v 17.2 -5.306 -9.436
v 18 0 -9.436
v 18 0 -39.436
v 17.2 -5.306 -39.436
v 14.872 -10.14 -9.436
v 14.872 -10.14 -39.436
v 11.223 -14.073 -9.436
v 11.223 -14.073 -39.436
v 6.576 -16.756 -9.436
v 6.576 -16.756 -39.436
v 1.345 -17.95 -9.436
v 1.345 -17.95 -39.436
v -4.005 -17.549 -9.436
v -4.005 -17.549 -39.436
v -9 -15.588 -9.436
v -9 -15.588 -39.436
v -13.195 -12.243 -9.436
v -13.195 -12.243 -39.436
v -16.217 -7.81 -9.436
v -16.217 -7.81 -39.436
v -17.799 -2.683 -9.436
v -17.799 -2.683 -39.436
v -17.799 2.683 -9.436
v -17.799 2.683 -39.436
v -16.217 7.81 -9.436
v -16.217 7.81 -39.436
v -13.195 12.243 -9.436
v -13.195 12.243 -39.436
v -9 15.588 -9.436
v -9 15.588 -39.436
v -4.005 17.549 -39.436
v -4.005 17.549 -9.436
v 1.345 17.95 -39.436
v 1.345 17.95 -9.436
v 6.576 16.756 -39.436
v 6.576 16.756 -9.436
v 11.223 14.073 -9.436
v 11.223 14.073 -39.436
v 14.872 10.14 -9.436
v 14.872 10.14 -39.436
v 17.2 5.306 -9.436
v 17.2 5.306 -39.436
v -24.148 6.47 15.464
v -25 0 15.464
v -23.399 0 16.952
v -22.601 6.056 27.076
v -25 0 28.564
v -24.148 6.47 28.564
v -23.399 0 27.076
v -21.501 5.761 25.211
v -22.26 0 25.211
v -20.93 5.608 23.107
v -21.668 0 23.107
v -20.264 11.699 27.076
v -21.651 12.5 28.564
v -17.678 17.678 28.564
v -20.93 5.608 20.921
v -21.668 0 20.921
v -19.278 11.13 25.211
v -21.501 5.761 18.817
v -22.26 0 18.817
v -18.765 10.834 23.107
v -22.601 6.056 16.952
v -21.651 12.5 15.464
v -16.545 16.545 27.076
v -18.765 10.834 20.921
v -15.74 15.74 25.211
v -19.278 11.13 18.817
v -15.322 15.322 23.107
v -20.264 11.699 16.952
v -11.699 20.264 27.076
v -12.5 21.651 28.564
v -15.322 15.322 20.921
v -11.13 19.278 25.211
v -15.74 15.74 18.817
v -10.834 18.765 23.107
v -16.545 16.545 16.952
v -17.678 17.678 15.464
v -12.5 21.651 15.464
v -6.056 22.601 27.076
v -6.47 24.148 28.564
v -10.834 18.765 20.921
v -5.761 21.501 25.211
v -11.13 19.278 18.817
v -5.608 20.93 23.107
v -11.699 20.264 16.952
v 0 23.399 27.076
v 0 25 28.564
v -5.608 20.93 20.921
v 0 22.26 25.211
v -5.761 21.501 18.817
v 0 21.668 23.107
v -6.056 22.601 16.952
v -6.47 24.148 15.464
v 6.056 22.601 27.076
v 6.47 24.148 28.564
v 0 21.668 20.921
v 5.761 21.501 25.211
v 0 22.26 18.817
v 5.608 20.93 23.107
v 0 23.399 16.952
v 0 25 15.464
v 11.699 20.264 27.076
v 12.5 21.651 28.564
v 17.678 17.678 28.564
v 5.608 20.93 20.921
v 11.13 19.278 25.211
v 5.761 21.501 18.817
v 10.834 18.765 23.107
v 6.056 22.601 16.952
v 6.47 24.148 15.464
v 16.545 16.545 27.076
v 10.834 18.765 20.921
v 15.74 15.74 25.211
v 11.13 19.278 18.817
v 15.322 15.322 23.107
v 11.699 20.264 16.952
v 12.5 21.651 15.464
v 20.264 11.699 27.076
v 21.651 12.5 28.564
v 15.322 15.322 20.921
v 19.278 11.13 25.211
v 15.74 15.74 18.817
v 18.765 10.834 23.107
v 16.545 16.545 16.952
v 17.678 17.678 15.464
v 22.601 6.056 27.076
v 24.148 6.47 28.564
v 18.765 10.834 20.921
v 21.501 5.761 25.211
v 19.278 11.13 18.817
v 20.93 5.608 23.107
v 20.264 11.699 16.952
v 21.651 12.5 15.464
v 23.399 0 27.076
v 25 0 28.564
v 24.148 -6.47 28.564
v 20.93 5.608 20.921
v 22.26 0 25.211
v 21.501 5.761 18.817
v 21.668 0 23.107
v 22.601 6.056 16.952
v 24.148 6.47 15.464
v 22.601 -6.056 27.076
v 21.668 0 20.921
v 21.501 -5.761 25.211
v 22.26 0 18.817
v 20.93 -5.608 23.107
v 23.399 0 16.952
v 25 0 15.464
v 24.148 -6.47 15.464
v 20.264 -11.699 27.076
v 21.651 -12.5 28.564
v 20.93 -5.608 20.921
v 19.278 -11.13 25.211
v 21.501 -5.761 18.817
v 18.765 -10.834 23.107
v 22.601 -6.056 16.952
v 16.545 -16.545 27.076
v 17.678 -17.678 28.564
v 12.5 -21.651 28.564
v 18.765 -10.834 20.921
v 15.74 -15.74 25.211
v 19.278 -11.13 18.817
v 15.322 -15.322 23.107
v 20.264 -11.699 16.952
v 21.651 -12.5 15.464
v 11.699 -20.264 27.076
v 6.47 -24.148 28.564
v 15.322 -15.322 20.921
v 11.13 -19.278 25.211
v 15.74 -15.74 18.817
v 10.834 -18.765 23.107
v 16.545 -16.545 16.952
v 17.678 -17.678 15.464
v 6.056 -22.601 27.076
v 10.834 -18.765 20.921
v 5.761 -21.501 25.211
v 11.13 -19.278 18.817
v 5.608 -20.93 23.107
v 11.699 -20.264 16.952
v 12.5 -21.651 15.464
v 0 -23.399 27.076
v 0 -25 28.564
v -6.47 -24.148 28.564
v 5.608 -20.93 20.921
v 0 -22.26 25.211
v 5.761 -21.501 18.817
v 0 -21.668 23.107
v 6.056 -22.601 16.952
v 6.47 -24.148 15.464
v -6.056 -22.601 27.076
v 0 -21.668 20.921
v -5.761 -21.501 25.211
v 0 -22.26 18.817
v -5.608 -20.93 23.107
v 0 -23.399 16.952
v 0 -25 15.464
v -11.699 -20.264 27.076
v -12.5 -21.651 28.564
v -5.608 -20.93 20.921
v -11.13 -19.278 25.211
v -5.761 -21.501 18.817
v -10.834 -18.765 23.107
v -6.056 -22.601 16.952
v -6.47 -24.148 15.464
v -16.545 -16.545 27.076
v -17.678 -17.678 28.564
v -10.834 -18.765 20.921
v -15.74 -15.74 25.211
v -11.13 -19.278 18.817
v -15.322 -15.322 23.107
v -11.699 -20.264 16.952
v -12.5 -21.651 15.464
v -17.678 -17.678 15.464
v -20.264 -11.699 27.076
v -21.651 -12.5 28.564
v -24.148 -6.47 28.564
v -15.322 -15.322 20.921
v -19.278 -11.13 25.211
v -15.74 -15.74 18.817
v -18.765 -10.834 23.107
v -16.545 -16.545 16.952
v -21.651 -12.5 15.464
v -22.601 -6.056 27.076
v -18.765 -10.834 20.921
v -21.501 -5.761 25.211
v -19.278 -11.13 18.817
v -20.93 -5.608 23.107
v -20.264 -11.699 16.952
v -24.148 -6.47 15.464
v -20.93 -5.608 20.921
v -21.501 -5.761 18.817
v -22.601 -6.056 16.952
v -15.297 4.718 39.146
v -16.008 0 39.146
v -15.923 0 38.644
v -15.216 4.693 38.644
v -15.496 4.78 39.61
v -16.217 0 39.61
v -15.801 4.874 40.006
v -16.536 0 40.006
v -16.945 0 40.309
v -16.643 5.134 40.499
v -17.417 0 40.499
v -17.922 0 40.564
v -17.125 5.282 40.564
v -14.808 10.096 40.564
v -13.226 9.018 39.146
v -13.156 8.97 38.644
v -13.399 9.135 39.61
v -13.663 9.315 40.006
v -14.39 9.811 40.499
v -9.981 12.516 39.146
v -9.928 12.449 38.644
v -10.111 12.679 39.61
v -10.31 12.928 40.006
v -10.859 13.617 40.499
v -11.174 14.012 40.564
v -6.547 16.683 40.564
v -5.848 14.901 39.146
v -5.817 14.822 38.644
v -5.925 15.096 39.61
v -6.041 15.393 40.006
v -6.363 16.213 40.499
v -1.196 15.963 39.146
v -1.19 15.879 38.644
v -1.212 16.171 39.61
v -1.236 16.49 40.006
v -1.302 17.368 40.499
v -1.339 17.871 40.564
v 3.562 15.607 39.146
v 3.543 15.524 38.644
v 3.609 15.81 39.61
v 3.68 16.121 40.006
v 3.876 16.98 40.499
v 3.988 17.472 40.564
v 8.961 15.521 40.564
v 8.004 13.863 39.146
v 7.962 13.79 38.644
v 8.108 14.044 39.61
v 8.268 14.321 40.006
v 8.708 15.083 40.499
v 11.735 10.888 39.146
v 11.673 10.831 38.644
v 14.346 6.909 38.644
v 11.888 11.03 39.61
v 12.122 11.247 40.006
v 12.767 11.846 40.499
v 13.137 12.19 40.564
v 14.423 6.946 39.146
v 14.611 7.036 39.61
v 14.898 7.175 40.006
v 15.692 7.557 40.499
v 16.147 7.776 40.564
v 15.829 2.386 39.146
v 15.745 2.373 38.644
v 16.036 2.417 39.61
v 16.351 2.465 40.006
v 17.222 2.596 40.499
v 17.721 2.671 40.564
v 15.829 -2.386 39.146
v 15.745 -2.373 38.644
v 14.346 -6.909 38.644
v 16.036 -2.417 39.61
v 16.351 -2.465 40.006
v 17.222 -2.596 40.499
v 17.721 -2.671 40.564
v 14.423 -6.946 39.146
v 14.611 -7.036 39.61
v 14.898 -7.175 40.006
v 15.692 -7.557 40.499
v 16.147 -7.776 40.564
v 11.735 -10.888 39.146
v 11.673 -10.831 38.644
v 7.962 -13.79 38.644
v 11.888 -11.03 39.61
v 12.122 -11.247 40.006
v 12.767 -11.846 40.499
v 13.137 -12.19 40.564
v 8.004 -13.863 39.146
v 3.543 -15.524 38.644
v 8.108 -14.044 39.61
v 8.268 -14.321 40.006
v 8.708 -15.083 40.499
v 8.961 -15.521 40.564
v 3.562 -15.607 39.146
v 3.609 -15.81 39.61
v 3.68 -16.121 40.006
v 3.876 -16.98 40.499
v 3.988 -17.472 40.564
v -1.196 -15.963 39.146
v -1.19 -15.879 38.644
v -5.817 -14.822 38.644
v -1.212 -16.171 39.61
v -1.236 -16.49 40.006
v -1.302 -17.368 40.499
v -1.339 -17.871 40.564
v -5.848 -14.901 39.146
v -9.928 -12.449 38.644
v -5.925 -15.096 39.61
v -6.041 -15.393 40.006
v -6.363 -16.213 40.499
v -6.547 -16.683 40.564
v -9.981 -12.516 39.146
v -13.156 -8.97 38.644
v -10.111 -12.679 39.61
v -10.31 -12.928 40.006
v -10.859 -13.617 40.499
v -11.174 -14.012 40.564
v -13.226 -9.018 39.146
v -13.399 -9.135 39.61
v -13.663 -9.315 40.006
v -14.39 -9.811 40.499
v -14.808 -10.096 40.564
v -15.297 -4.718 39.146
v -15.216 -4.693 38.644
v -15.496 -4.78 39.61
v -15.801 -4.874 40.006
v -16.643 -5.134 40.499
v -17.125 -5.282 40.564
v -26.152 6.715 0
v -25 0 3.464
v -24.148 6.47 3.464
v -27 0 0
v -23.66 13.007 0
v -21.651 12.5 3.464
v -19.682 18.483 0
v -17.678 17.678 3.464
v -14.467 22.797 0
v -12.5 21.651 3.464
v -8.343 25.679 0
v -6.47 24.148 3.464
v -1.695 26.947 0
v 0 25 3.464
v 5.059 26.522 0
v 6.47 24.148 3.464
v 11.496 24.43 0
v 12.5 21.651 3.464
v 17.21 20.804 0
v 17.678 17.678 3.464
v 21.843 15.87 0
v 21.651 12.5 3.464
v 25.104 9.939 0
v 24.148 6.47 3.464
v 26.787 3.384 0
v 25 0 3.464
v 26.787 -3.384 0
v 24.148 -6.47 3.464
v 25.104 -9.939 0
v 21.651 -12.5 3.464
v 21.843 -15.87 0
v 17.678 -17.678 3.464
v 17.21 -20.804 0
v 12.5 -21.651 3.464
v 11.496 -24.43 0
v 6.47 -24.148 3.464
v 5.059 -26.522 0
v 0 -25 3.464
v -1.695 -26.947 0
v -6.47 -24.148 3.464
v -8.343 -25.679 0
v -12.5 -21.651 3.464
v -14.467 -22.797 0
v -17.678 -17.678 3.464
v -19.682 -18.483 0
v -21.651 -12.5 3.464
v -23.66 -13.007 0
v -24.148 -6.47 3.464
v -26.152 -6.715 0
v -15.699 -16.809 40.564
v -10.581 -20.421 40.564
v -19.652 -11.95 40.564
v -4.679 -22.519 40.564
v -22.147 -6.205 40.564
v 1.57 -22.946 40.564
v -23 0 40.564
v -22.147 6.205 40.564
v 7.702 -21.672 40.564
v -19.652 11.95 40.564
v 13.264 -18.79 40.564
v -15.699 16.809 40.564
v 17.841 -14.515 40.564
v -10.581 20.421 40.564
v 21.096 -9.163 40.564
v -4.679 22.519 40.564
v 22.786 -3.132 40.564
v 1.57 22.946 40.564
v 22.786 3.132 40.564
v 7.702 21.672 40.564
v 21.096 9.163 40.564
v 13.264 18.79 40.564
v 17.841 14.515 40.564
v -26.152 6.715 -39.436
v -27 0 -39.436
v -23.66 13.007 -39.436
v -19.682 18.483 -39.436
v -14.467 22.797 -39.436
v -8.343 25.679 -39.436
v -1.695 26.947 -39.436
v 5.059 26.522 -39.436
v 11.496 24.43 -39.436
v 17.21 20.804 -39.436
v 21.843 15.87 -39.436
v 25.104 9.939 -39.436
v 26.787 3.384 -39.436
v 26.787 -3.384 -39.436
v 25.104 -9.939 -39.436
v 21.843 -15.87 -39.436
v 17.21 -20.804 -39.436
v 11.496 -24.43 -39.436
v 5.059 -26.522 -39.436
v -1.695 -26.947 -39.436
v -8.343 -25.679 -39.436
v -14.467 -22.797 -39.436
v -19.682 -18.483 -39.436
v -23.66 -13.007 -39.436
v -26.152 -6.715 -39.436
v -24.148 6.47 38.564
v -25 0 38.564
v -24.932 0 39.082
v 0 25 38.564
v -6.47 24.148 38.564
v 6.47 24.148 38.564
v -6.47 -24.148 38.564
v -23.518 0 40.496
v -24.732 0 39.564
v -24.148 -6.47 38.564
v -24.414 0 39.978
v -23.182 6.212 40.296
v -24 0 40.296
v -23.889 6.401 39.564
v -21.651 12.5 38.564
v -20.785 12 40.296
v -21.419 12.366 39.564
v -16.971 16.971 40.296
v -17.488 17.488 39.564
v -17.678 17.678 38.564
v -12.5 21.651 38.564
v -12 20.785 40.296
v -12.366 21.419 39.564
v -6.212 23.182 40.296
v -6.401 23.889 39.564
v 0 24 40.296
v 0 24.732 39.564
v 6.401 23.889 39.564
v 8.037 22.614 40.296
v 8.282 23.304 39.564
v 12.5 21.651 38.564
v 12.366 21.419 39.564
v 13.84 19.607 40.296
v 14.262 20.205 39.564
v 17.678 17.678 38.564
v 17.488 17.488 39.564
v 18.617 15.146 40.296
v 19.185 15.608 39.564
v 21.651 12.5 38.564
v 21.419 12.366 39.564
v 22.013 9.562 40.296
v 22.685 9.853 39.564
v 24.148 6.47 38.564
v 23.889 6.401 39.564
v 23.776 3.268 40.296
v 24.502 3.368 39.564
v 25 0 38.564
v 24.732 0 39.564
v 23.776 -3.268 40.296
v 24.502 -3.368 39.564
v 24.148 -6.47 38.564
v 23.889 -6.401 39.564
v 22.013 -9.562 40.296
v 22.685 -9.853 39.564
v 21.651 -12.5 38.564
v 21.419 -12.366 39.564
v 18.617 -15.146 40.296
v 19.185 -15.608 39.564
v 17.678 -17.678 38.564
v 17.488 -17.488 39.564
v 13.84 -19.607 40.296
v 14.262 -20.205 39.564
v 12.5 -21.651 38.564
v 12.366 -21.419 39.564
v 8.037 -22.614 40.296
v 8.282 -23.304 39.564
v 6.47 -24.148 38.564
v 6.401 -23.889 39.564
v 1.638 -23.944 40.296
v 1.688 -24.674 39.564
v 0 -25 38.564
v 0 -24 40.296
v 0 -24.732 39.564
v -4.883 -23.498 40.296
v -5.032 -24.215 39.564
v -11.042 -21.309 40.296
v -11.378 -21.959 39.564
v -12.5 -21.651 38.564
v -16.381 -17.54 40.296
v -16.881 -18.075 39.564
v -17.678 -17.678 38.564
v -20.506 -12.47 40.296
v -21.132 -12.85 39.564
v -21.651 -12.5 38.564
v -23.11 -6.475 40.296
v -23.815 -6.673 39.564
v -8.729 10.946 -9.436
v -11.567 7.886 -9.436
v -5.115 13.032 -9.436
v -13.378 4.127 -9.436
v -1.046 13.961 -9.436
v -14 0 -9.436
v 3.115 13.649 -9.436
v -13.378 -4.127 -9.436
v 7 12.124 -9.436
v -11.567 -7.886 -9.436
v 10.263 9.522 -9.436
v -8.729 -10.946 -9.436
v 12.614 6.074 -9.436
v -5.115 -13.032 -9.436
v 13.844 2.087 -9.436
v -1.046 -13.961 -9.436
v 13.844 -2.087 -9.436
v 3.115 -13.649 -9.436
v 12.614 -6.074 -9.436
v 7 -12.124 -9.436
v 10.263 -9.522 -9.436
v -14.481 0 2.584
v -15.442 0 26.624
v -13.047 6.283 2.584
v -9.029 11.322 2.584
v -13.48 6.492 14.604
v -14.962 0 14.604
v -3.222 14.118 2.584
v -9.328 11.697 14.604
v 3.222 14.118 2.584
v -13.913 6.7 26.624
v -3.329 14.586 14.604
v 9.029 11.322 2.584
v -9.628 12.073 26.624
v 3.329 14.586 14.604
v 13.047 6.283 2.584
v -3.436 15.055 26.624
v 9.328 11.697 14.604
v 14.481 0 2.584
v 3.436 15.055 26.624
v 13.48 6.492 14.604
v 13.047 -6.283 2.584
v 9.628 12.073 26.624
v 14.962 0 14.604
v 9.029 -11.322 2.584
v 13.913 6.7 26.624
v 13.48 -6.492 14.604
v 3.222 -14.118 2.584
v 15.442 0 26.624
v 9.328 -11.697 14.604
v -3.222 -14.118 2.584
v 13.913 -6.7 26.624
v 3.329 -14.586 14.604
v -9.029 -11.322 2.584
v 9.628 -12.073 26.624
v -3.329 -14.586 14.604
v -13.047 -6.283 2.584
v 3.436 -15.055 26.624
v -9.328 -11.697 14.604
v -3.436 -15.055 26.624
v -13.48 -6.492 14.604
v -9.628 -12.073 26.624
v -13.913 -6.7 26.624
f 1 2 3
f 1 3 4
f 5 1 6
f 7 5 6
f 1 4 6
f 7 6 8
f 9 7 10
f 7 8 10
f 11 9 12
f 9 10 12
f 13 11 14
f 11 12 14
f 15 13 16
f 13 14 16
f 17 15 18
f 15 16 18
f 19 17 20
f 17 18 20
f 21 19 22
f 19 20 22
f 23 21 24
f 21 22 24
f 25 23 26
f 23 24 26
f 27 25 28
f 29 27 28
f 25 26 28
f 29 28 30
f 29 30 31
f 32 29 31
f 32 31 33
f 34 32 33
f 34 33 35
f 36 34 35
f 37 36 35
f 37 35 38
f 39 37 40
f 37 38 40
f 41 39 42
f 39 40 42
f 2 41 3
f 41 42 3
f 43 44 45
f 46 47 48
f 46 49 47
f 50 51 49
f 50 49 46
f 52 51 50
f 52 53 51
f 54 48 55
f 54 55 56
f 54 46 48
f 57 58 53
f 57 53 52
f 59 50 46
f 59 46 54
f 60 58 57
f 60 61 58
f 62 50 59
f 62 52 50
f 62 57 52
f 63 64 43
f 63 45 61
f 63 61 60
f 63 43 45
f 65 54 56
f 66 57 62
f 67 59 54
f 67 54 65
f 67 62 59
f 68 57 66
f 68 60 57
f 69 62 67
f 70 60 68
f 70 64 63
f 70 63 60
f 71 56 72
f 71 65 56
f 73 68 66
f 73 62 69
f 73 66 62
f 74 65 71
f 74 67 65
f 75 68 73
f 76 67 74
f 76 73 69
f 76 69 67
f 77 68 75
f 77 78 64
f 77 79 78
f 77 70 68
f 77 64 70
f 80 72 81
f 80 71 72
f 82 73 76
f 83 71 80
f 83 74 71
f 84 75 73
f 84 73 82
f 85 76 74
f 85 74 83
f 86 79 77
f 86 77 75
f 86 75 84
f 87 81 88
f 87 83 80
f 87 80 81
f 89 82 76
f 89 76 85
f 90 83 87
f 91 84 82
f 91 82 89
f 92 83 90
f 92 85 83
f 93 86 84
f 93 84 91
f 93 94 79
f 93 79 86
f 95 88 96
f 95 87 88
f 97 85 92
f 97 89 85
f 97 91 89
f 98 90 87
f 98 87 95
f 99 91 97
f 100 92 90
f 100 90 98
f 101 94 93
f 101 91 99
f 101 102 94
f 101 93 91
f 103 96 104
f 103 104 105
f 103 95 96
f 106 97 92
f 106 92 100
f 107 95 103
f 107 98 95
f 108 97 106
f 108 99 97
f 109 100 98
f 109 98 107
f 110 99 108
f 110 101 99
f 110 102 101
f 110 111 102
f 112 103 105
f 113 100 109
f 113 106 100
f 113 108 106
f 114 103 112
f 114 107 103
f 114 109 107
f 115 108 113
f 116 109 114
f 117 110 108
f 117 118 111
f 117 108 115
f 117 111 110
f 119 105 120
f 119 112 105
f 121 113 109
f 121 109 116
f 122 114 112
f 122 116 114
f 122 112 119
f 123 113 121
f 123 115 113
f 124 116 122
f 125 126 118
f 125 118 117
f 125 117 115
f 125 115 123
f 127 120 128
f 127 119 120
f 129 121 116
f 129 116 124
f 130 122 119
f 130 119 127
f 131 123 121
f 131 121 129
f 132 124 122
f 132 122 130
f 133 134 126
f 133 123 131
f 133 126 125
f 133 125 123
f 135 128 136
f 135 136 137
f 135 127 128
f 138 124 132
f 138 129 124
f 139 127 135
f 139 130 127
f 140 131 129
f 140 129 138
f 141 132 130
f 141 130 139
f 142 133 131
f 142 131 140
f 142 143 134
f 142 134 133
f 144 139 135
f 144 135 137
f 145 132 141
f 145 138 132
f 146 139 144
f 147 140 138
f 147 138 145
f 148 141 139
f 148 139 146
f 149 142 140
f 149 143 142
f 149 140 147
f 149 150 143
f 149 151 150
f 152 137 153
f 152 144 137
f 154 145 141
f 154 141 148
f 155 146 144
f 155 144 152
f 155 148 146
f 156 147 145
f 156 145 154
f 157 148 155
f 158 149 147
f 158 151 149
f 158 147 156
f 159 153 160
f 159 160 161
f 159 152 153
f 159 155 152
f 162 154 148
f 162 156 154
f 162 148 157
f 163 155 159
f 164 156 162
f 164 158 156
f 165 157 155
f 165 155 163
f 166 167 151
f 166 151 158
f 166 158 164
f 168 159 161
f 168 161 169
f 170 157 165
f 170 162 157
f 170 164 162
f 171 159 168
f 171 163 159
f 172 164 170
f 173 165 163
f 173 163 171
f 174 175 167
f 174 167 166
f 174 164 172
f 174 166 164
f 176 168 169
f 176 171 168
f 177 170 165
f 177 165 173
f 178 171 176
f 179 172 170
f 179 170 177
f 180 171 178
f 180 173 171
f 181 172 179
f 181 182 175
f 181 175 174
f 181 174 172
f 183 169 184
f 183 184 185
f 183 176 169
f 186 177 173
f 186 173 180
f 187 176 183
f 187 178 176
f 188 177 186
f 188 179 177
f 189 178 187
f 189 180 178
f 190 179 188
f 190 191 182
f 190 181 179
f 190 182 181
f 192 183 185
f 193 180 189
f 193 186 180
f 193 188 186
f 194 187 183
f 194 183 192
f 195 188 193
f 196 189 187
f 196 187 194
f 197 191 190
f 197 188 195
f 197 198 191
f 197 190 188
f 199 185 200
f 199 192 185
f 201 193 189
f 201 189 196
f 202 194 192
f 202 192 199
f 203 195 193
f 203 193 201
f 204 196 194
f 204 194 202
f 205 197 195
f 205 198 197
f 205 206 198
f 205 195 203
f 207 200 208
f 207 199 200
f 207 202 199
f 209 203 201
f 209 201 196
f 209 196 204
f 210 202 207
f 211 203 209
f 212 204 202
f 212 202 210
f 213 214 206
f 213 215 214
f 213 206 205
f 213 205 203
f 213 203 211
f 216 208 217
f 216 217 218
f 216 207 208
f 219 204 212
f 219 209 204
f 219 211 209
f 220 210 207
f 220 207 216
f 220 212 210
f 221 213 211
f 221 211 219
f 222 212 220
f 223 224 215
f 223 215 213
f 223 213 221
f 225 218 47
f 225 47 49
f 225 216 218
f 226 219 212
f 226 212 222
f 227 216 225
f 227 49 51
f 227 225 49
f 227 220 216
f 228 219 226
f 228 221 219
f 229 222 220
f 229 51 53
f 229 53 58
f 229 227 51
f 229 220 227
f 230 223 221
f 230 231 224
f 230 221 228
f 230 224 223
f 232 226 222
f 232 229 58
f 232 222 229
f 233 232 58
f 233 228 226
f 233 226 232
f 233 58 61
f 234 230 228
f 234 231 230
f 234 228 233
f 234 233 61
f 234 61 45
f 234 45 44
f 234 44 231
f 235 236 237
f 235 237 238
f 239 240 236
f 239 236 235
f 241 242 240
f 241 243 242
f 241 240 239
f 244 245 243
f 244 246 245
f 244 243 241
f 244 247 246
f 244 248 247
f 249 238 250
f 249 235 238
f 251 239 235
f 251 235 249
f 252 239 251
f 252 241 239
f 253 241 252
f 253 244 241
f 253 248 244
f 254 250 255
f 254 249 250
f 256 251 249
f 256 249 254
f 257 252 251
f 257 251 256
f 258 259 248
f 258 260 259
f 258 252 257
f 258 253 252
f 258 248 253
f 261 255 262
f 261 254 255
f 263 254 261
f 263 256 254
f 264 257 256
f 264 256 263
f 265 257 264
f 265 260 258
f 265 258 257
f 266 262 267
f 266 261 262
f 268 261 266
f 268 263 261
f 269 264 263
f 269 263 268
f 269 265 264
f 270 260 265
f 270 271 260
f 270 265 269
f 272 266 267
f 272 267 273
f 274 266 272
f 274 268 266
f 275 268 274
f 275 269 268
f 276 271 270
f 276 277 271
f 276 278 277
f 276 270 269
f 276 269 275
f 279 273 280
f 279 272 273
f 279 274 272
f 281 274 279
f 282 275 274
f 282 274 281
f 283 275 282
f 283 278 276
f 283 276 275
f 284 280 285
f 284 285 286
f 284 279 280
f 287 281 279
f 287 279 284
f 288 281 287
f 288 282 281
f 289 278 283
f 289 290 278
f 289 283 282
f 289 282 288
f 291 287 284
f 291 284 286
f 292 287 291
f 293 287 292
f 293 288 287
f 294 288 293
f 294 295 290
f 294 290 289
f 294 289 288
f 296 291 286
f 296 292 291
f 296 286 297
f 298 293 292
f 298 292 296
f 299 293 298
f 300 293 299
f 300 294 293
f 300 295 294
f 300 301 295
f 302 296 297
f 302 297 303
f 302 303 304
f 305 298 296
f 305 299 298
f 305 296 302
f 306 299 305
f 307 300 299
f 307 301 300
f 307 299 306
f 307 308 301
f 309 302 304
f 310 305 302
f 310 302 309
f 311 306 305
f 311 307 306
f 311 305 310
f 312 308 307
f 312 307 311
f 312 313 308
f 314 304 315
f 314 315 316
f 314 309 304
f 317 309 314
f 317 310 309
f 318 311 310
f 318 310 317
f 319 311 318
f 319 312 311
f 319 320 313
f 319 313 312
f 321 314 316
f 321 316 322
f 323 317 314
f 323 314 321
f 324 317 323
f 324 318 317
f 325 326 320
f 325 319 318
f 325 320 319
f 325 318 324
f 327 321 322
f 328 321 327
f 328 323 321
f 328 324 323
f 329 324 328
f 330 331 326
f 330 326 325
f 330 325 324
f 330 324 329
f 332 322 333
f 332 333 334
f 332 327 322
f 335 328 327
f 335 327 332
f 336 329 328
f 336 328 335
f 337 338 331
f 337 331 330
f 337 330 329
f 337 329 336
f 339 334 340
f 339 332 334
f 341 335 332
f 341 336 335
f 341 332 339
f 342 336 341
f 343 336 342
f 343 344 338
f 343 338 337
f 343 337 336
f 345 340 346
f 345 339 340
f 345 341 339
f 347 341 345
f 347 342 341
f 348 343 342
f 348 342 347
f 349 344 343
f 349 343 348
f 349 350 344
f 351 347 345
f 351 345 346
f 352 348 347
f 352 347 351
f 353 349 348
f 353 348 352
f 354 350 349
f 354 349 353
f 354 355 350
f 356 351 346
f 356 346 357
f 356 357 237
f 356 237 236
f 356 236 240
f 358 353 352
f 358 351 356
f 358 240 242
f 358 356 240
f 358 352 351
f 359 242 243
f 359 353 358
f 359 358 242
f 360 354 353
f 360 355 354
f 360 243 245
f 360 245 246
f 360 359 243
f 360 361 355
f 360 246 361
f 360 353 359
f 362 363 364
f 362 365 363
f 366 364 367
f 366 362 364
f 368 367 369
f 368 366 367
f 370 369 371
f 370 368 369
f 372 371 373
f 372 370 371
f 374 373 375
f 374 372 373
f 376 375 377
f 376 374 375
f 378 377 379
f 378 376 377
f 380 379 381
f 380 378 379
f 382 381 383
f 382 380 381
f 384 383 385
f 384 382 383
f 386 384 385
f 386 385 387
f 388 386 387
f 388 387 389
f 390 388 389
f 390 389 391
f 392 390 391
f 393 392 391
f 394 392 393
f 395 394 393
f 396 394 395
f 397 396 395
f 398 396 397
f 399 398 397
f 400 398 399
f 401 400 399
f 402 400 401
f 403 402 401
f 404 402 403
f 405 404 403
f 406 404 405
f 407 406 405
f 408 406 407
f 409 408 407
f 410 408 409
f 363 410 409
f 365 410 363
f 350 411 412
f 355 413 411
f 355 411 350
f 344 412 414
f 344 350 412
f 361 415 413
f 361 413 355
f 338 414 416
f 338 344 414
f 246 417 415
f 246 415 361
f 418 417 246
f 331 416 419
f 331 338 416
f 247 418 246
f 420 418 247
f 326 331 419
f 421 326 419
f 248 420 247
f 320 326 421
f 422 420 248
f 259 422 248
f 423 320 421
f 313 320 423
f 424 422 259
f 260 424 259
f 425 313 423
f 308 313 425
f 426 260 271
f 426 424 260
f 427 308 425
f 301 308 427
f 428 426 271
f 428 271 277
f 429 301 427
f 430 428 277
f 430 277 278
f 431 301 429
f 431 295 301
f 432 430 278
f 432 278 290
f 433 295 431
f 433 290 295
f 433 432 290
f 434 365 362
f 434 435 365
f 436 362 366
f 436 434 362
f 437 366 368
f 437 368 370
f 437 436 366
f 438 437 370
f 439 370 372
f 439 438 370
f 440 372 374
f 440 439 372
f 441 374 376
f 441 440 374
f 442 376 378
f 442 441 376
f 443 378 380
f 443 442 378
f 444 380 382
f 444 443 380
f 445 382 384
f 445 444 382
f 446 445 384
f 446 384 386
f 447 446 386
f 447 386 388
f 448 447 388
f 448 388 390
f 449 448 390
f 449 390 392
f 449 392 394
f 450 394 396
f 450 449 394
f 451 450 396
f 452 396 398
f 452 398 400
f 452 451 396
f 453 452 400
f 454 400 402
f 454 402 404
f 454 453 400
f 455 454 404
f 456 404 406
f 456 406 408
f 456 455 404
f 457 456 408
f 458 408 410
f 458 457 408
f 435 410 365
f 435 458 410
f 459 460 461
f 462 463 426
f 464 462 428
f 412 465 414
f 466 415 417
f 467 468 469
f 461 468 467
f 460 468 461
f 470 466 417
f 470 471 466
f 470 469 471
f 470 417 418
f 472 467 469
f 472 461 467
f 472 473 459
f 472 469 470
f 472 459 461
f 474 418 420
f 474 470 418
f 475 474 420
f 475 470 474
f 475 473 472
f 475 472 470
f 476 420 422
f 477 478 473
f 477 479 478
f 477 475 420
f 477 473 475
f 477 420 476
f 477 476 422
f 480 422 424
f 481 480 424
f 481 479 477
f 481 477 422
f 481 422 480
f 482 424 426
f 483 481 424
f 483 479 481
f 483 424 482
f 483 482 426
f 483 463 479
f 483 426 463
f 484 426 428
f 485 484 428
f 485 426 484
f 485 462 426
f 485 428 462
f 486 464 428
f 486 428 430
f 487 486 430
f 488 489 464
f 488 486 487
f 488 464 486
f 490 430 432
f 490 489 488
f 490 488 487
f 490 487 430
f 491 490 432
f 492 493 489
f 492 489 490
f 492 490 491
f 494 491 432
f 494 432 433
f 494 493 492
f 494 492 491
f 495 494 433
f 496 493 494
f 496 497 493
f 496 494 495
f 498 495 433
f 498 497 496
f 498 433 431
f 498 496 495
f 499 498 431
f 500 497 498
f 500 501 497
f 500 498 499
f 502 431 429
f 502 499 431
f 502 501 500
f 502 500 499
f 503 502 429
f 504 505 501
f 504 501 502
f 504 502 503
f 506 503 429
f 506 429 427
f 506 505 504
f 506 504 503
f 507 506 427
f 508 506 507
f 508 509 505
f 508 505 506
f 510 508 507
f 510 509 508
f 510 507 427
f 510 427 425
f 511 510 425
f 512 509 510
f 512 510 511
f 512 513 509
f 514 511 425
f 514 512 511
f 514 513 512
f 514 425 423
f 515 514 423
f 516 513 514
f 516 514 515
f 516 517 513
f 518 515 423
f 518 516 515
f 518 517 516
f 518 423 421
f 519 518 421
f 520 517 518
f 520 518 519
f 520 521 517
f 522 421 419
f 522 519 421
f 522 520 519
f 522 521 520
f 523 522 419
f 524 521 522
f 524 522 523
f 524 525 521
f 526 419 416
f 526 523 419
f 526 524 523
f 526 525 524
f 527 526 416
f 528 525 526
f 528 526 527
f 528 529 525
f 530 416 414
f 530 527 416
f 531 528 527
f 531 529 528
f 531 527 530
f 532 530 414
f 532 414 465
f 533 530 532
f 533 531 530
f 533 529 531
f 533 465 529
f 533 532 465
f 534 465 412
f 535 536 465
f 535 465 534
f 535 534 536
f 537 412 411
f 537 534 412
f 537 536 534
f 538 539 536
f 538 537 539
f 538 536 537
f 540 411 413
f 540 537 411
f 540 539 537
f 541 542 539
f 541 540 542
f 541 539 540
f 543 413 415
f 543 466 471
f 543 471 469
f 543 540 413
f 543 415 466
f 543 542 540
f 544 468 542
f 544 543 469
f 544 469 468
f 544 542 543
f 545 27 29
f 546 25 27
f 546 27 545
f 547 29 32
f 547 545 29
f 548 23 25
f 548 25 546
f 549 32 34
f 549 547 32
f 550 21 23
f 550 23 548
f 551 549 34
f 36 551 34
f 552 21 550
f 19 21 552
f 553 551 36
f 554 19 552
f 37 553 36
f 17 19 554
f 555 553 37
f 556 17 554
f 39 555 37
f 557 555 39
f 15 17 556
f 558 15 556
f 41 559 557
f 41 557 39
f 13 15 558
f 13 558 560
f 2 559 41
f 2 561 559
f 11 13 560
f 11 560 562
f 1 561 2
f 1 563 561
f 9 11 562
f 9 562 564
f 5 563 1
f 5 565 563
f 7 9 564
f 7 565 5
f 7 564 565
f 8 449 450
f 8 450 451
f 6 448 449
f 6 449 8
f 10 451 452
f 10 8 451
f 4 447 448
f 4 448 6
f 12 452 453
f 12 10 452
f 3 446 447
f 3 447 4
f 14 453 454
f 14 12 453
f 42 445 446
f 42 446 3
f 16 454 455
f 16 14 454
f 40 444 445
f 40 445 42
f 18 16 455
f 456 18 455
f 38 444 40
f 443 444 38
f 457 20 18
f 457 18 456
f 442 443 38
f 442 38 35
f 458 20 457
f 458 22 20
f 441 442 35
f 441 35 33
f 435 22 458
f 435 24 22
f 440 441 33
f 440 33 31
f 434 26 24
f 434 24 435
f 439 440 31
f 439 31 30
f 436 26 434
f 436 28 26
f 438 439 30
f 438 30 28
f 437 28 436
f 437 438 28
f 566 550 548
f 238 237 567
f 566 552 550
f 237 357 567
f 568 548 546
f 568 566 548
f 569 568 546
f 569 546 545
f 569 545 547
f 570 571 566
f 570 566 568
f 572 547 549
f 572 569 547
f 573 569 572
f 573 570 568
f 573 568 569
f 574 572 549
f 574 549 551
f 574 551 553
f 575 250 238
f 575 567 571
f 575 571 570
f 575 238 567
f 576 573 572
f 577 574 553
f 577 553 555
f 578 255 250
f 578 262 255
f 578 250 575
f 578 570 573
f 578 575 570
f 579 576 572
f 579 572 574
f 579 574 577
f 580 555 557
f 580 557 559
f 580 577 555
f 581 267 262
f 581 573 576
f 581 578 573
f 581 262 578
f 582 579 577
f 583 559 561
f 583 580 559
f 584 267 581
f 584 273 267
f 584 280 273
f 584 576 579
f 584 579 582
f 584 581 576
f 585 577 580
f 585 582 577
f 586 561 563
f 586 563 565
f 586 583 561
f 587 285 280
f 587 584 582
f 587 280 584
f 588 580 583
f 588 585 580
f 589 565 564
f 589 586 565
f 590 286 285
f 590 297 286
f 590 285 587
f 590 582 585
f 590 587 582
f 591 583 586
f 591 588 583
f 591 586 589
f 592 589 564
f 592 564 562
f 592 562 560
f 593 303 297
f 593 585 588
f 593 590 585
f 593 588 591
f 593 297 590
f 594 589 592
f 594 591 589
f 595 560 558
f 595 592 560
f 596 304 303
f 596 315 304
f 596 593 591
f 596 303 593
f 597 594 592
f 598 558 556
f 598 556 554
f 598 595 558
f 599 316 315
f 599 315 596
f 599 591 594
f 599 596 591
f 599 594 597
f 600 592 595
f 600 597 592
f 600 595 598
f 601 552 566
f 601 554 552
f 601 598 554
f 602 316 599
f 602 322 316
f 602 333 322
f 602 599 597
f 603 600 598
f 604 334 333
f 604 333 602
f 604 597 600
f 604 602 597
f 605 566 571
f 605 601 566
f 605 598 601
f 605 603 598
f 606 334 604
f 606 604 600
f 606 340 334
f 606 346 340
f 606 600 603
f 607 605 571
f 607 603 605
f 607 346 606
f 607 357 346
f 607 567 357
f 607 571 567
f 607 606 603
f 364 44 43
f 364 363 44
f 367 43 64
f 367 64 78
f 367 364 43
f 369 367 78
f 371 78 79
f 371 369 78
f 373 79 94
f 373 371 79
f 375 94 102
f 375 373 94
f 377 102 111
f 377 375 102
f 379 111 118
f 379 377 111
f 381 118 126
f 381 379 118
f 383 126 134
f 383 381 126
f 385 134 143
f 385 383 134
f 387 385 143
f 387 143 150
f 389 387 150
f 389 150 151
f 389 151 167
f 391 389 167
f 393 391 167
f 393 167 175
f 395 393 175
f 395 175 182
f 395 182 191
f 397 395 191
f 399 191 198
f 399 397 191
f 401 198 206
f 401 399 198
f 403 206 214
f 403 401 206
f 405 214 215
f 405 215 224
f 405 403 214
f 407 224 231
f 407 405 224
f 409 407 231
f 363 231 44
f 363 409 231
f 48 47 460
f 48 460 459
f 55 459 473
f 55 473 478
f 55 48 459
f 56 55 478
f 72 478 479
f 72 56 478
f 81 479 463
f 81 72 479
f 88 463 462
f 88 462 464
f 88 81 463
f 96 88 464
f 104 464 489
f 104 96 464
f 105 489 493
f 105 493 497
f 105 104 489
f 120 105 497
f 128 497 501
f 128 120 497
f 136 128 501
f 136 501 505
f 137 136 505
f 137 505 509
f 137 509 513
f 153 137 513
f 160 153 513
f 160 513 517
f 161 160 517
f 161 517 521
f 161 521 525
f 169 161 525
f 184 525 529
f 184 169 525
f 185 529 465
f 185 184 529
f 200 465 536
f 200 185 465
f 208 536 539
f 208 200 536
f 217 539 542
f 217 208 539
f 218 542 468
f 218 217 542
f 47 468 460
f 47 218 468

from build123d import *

# Parameters (mm, degrees)
F2_R     = 2
F3_R     = 18
F3_R_2   = 14
F4_DEPTH = 30


# Not quite as in the source:
# - a feature names something its author has since deleted; it is built from what else it names


with BuildPart() as f1:
    # F0 (on Front) → F1 (revolve)
    with BuildSketch(Plane.XZ):
        with BuildLine():
            Line((-14, -9.4360596032), (-16, 40.5639403968))
            Line((-16, 40.5639403968), (-25, 40.5639403968))
            Line((-25, 40.5639403968), (-25, 28.5639403968))
            ThreePointArc((-25, 28.5639403968), (-21.593316446, 22.014021006), (-25, 15.4641016151))
            Line((-25, 15.4641016151), (-25, 3.4641016151))
            Line((-25, 3.4641016151), (-27, 0))
            Line((-27, 0), (-27, -39.4360596032))
            Line((-27, -39.4360596032), (-18, -39.4360596032))
            Line((-18, -39.4360596032), (-14, -39.4360596032))
            Line((-14, -39.4360596032), (-14, -9.4360596032))
        make_face()
    revolve(axis=Axis((0, 0, -1.7232764512), (0, 0, -1)))

    # F2
    f2_edges = [f1.edges().sort_by_distance(p)[0] for p in [
        (16, 0, 40.56394),
        (25, 0, 40.56394),
    ]]
    fillet(f2_edges, radius=F2_R)

    # F3 (on face) → F4 (cut)
    with BuildSketch(Plane(origin=(0, 0, -39.4360596032), x_dir=(1, 0, 0), z_dir=(0, 0, -1))):
        Circle(F3_R)
        Circle(F3_R_2, mode=Mode.SUBTRACT)
    extrude(amount=-F4_DEPTH, mode=Mode.SUBTRACT)


solid = f1.part
